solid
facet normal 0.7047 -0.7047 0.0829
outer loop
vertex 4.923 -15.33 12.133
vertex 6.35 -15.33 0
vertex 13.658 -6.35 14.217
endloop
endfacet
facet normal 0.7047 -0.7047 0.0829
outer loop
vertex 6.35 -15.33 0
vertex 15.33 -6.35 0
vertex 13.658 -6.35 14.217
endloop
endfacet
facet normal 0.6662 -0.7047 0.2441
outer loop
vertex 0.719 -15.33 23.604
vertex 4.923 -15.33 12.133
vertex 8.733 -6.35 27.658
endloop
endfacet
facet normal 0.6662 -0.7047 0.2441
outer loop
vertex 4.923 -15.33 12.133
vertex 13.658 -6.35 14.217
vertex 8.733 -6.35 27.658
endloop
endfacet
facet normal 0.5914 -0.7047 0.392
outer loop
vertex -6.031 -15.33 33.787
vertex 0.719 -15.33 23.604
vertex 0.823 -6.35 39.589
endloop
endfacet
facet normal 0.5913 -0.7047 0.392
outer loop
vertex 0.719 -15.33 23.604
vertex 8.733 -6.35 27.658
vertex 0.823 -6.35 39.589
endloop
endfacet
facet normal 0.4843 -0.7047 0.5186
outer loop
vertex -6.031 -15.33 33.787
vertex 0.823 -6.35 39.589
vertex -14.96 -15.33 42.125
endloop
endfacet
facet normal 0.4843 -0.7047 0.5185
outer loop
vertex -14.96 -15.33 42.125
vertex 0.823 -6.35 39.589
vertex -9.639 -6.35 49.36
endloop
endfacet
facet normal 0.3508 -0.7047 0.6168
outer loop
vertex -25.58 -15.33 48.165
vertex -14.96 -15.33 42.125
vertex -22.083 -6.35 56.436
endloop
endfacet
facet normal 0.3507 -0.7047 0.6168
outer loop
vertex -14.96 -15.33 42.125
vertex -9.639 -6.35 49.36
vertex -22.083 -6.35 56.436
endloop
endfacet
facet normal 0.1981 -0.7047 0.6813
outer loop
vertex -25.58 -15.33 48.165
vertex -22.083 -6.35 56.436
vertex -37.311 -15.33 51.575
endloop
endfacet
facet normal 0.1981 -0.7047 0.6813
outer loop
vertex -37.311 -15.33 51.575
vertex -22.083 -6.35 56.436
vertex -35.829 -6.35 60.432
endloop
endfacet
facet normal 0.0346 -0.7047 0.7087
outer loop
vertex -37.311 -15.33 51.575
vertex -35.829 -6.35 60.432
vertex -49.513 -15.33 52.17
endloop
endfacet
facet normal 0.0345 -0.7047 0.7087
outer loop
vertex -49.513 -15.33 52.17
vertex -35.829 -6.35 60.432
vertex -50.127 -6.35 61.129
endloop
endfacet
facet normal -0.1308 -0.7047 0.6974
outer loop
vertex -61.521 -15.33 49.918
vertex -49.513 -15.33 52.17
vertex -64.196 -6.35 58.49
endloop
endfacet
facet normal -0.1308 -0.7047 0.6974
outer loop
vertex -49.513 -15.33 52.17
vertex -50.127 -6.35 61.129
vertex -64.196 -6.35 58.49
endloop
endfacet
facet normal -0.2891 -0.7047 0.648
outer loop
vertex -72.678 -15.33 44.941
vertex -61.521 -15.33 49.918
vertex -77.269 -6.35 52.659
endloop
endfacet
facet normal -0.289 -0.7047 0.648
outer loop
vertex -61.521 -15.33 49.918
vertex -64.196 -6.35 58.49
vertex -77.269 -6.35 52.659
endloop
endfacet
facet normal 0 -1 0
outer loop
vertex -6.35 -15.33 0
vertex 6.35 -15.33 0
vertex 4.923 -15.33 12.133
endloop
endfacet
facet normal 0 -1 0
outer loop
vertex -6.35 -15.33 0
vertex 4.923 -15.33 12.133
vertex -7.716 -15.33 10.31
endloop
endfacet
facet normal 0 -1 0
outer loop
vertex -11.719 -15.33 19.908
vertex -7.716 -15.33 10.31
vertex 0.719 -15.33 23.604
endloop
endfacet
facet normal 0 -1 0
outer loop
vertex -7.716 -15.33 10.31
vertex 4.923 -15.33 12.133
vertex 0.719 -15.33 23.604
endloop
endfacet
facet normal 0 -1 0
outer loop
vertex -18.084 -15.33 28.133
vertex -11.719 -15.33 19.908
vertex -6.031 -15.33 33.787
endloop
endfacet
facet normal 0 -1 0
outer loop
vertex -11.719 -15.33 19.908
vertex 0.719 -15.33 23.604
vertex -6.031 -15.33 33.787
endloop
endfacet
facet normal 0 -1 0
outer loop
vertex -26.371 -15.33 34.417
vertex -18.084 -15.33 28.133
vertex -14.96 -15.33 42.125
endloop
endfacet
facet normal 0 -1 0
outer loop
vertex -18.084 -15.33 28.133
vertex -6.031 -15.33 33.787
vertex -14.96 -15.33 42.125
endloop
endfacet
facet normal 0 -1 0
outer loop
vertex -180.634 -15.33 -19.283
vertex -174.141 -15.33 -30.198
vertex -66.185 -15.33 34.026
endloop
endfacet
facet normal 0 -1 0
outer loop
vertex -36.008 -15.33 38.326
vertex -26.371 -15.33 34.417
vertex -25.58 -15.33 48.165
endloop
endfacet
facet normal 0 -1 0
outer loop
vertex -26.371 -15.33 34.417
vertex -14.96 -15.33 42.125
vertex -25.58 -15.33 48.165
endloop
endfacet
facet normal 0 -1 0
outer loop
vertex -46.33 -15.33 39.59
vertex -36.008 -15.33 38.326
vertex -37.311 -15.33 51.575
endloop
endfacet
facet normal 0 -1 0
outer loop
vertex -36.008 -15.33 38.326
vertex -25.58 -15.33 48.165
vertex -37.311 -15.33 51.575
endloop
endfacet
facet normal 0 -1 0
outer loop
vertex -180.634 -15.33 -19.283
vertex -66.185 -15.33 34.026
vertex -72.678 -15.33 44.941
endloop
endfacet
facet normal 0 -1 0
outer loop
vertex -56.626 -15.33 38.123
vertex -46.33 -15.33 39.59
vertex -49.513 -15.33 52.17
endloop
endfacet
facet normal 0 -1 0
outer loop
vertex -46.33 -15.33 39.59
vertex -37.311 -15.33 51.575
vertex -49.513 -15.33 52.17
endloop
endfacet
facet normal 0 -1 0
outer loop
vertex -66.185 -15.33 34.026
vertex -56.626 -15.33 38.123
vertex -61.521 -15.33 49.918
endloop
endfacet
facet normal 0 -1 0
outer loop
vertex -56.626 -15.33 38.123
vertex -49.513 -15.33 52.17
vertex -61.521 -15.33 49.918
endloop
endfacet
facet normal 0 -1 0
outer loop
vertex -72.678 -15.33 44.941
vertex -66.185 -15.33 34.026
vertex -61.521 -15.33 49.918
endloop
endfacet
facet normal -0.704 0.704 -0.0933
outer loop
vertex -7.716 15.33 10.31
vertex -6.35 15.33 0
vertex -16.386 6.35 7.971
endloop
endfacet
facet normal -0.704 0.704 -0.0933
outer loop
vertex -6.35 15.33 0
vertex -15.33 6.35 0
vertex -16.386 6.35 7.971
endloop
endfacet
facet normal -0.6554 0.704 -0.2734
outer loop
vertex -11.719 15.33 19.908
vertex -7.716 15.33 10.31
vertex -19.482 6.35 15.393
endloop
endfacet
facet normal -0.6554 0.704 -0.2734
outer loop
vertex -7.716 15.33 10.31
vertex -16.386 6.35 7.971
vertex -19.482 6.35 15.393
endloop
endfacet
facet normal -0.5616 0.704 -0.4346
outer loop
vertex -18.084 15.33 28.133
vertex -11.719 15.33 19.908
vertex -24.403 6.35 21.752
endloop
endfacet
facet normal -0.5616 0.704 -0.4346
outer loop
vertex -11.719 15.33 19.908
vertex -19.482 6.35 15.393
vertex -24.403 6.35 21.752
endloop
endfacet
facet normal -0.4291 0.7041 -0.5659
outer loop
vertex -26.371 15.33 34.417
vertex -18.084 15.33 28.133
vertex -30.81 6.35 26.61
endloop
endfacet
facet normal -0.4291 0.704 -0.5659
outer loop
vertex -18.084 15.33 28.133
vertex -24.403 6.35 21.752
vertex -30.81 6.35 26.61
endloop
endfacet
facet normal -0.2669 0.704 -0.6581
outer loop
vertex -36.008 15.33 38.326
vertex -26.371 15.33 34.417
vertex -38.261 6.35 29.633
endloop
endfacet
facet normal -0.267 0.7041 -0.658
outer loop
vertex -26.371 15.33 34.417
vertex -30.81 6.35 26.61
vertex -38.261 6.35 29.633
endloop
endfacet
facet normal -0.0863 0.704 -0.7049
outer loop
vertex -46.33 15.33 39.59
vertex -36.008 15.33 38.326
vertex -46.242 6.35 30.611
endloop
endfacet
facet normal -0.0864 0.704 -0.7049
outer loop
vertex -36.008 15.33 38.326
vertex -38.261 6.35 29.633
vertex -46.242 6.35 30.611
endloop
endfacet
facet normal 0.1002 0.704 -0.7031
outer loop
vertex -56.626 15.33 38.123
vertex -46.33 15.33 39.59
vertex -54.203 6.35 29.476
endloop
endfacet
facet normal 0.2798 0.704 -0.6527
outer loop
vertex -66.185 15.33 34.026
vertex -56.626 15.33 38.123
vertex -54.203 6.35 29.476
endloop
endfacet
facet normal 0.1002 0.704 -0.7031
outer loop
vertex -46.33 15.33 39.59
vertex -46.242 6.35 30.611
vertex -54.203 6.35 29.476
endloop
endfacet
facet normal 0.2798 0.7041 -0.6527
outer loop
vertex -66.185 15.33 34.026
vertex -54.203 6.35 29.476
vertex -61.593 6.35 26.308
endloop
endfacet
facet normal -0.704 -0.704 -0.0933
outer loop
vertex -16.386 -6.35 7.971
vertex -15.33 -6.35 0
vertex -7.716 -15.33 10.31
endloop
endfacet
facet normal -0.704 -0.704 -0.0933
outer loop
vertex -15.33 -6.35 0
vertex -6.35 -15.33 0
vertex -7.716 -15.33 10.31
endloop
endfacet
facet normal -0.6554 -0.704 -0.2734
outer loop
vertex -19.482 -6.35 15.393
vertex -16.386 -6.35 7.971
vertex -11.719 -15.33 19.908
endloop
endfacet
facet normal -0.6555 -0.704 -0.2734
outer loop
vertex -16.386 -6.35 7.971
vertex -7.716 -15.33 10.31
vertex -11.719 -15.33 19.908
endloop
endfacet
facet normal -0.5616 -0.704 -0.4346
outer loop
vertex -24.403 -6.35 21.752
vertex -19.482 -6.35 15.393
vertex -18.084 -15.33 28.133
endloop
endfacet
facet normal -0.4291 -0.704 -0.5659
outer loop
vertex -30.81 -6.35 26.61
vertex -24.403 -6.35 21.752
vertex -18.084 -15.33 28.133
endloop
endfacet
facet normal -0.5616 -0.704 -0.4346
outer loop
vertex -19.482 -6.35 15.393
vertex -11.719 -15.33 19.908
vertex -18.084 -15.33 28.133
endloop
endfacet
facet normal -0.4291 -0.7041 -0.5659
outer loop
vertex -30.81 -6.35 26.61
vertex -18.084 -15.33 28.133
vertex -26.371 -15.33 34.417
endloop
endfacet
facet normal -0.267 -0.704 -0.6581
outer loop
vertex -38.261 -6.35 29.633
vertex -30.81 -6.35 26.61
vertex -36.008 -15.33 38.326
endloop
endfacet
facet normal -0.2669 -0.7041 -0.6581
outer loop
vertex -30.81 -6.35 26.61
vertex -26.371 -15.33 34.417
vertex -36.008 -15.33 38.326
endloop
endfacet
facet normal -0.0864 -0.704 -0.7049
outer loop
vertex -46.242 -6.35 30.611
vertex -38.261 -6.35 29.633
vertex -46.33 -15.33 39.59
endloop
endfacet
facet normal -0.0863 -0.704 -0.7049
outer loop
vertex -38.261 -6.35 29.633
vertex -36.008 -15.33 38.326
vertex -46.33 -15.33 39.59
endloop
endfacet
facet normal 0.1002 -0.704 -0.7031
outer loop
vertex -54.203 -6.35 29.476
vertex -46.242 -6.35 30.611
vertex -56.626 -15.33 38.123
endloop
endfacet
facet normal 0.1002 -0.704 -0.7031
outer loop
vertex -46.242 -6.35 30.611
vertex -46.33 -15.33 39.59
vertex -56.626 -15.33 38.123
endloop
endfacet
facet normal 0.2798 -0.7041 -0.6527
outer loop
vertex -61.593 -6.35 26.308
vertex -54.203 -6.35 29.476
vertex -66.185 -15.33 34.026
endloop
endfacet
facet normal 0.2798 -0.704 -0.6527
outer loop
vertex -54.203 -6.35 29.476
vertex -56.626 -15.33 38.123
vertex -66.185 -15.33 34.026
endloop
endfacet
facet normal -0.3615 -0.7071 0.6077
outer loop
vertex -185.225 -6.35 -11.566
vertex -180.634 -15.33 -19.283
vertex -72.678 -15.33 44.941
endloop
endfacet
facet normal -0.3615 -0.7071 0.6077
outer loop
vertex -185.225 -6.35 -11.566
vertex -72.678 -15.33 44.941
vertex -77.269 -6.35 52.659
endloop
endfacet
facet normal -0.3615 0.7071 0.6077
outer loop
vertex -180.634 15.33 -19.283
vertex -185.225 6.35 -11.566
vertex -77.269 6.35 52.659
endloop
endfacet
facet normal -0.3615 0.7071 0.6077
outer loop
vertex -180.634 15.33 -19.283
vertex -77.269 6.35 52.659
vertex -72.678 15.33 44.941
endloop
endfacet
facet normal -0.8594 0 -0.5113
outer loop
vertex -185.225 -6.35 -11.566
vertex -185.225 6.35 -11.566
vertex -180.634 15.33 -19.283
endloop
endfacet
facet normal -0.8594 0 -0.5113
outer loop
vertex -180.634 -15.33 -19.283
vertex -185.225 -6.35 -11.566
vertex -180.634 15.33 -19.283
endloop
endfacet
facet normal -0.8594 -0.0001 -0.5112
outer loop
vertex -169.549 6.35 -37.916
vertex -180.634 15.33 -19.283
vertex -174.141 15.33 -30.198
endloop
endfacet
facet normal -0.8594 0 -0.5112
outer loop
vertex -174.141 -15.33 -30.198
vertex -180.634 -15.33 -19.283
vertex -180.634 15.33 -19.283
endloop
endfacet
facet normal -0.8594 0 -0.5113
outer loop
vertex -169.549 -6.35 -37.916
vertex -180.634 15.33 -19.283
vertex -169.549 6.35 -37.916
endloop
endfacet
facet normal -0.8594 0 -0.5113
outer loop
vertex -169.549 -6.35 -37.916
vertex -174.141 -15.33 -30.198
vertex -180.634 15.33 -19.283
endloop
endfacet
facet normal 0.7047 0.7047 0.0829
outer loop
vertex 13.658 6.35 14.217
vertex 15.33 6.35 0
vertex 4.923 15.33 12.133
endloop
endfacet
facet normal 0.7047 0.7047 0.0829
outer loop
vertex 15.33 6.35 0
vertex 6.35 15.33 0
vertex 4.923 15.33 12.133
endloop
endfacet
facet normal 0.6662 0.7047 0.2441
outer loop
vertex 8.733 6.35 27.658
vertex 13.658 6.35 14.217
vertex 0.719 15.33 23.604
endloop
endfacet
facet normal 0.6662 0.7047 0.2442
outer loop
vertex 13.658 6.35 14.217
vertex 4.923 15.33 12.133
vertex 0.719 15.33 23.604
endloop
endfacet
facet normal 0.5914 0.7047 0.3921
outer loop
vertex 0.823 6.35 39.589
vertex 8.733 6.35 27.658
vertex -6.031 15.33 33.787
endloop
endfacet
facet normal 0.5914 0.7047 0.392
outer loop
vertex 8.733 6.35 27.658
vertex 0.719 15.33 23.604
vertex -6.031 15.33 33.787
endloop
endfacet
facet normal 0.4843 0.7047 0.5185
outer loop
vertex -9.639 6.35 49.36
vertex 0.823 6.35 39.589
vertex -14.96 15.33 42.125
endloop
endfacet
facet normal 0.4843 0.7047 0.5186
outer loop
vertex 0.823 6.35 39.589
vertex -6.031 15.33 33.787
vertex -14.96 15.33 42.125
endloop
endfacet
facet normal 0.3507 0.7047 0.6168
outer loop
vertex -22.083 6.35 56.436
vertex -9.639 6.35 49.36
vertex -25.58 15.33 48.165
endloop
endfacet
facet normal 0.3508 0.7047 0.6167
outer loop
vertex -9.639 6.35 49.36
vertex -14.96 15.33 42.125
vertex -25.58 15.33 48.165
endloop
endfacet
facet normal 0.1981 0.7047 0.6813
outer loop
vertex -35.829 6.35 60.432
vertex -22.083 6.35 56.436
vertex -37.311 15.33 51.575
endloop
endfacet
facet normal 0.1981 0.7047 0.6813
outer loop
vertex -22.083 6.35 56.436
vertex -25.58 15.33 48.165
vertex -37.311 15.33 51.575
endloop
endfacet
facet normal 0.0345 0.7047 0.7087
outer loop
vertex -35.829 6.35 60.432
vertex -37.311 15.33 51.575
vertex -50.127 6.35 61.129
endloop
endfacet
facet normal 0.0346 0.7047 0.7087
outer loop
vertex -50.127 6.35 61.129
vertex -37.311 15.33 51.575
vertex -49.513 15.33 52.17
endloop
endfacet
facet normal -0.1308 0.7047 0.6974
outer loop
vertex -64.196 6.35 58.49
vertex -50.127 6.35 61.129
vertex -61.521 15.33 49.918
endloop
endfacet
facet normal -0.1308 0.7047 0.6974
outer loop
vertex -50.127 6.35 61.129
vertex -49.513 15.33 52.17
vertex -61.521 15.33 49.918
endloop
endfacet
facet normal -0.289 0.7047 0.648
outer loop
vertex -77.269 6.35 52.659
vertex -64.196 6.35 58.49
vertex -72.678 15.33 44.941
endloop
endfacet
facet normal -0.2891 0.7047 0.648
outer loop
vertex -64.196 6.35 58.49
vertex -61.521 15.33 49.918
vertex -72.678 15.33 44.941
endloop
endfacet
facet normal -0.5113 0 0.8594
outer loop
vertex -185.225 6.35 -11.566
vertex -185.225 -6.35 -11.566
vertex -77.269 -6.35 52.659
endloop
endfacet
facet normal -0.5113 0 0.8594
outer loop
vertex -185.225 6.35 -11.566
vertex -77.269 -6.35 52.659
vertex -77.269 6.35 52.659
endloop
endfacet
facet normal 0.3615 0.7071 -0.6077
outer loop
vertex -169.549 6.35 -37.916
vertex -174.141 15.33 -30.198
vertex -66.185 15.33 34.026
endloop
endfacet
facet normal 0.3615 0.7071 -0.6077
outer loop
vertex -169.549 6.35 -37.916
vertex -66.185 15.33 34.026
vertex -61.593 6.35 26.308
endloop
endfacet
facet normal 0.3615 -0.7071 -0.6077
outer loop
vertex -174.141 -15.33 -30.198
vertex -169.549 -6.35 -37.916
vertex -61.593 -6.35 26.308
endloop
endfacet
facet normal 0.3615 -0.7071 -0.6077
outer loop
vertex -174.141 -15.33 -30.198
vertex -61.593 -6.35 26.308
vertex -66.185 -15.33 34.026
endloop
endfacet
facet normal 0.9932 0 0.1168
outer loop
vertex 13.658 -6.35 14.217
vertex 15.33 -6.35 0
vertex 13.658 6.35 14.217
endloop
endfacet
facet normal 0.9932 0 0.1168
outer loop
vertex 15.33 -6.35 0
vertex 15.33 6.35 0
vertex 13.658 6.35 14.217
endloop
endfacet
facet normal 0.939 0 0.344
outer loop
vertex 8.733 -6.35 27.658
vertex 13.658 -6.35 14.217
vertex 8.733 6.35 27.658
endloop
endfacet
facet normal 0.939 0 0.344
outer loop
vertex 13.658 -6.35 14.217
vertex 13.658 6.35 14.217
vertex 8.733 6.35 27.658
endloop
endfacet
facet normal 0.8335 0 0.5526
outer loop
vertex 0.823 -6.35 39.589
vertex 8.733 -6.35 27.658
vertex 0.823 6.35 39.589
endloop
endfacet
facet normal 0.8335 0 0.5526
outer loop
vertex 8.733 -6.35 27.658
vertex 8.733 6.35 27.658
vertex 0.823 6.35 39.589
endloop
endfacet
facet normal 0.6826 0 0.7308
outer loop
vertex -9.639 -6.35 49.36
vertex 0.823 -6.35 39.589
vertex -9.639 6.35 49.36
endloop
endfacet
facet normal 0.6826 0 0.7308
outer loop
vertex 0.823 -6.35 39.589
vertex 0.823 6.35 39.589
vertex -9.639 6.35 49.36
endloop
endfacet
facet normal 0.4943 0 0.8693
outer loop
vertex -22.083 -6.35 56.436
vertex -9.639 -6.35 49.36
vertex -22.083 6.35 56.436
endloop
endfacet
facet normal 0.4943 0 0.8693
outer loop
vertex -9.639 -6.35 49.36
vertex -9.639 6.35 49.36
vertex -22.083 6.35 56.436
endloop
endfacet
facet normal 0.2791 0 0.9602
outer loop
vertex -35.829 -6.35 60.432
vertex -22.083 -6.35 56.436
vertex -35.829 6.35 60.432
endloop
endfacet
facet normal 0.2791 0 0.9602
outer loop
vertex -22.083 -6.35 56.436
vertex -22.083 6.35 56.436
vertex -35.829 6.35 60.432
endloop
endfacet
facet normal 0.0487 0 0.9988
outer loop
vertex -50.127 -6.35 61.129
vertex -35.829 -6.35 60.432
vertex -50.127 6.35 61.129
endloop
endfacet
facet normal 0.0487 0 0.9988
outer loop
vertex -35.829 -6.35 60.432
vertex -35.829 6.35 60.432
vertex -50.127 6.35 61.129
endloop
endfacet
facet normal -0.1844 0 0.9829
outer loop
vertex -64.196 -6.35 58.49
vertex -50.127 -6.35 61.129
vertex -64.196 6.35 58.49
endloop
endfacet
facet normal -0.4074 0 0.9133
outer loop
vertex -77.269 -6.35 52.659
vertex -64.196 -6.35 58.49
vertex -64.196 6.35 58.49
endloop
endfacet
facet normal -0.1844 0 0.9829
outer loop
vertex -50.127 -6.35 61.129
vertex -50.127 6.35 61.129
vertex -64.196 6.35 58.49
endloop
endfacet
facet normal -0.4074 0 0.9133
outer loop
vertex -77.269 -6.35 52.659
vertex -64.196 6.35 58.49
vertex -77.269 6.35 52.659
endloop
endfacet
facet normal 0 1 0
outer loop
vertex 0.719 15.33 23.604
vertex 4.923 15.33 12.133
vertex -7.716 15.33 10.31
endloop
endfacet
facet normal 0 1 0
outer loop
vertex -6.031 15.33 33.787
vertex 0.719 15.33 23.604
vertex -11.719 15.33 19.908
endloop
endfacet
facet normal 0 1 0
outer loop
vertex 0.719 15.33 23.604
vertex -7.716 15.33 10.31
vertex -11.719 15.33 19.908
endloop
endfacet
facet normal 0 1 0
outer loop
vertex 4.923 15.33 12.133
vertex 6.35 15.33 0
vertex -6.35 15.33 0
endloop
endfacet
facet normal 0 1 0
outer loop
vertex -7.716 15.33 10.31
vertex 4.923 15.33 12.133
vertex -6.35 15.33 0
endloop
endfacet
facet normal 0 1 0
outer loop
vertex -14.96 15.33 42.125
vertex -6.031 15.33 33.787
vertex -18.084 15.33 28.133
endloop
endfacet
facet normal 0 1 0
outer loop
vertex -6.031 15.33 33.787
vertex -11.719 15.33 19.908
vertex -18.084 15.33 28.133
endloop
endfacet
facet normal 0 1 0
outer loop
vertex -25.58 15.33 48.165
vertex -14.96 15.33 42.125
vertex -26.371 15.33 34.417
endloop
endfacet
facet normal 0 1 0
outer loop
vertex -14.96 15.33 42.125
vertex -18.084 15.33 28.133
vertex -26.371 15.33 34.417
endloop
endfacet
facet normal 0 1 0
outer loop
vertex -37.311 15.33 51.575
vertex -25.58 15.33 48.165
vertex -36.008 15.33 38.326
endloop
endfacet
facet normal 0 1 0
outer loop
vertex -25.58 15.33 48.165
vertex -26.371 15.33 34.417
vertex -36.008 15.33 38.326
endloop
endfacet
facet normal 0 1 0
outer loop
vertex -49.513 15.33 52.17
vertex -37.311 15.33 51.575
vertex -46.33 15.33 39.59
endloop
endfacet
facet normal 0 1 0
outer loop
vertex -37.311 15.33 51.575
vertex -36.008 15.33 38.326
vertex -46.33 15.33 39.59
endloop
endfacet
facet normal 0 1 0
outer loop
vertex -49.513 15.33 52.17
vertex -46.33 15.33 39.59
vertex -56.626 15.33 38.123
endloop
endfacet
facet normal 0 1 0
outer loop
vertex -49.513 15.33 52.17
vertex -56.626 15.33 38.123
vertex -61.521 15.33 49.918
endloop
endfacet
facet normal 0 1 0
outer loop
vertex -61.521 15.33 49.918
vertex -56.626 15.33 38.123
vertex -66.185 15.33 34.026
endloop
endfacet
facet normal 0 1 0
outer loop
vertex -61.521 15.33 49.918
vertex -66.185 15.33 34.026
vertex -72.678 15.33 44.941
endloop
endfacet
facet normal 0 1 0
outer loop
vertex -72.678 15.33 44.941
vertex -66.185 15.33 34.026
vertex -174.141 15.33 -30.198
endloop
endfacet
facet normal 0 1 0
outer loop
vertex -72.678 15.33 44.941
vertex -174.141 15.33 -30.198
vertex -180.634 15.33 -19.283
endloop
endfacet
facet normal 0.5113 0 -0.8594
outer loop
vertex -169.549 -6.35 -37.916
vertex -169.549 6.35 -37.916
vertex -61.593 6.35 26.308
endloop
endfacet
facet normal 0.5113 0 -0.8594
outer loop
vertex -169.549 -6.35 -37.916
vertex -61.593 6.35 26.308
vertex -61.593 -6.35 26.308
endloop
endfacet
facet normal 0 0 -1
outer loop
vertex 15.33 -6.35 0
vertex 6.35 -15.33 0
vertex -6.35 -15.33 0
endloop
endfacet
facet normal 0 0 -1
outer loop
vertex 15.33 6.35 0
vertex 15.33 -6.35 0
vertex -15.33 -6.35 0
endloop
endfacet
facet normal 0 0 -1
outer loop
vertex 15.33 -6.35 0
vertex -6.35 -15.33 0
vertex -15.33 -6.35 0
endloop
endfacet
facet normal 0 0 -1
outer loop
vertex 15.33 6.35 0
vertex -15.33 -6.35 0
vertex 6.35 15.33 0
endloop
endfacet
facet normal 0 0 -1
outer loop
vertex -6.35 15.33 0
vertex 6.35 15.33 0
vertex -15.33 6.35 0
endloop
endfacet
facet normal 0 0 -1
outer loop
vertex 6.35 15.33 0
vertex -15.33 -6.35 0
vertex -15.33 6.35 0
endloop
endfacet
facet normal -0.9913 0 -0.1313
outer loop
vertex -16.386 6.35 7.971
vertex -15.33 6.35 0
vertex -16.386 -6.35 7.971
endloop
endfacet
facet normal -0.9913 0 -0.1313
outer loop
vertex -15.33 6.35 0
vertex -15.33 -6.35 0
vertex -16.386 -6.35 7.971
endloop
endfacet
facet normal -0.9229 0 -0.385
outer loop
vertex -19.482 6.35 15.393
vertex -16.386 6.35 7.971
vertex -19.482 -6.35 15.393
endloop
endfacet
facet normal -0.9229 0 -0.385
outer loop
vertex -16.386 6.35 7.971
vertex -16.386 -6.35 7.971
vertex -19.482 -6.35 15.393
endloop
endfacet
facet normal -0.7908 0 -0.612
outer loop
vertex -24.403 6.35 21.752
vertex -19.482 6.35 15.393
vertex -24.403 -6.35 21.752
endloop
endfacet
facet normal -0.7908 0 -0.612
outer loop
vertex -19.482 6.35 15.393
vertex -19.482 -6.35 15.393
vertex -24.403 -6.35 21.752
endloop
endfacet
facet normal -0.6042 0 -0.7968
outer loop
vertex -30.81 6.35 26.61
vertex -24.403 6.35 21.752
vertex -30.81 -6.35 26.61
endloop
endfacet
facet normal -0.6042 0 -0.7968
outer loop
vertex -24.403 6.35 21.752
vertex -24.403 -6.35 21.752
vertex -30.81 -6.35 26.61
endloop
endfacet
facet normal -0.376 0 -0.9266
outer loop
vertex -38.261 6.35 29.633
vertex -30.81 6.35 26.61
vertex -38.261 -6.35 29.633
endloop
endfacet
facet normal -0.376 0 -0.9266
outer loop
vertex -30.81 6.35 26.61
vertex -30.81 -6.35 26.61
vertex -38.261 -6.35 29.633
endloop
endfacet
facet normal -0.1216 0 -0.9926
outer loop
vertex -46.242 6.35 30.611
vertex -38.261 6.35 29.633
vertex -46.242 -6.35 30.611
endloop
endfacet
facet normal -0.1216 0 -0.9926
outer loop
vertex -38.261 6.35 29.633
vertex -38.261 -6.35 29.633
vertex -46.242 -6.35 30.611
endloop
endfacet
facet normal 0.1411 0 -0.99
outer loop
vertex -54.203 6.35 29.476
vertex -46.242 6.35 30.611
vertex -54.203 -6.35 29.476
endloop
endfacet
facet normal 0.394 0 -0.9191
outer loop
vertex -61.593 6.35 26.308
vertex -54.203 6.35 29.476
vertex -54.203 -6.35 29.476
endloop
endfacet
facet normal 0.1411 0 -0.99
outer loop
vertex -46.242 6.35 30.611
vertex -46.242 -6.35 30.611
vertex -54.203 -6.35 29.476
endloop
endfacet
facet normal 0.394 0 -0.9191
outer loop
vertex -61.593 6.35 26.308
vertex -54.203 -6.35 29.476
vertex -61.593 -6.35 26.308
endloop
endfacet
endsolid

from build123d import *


with BuildPart() as f15:
    # F15: sweep along a path in F14
    with BuildLine(Plane.XZ) as f15_path:
        ThreePointArc((0, 0), (-23.231615305, 39.9364087047), (-69.4313943386, 39.4835211337))
        Line((-69.4313943386, 39.4835211337), (-177.3874624529, -24.7406701782))
    # F13 (on Top) → F15 (sweep)
    with BuildSketch(Plane.XY):
        Polygon((6.35, 15.3302561211), (-6.35, 15.3302561211), (-15.3302561211, 6.35), (-15.3302561211, -6.35), (-6.35, -15.3302561211), (6.35, -15.3302561211), (15.3302561211, -6.35), (15.3302561211, 6.35), align=None)
    sweep(path=f15_path.line)


solid = f15.part
